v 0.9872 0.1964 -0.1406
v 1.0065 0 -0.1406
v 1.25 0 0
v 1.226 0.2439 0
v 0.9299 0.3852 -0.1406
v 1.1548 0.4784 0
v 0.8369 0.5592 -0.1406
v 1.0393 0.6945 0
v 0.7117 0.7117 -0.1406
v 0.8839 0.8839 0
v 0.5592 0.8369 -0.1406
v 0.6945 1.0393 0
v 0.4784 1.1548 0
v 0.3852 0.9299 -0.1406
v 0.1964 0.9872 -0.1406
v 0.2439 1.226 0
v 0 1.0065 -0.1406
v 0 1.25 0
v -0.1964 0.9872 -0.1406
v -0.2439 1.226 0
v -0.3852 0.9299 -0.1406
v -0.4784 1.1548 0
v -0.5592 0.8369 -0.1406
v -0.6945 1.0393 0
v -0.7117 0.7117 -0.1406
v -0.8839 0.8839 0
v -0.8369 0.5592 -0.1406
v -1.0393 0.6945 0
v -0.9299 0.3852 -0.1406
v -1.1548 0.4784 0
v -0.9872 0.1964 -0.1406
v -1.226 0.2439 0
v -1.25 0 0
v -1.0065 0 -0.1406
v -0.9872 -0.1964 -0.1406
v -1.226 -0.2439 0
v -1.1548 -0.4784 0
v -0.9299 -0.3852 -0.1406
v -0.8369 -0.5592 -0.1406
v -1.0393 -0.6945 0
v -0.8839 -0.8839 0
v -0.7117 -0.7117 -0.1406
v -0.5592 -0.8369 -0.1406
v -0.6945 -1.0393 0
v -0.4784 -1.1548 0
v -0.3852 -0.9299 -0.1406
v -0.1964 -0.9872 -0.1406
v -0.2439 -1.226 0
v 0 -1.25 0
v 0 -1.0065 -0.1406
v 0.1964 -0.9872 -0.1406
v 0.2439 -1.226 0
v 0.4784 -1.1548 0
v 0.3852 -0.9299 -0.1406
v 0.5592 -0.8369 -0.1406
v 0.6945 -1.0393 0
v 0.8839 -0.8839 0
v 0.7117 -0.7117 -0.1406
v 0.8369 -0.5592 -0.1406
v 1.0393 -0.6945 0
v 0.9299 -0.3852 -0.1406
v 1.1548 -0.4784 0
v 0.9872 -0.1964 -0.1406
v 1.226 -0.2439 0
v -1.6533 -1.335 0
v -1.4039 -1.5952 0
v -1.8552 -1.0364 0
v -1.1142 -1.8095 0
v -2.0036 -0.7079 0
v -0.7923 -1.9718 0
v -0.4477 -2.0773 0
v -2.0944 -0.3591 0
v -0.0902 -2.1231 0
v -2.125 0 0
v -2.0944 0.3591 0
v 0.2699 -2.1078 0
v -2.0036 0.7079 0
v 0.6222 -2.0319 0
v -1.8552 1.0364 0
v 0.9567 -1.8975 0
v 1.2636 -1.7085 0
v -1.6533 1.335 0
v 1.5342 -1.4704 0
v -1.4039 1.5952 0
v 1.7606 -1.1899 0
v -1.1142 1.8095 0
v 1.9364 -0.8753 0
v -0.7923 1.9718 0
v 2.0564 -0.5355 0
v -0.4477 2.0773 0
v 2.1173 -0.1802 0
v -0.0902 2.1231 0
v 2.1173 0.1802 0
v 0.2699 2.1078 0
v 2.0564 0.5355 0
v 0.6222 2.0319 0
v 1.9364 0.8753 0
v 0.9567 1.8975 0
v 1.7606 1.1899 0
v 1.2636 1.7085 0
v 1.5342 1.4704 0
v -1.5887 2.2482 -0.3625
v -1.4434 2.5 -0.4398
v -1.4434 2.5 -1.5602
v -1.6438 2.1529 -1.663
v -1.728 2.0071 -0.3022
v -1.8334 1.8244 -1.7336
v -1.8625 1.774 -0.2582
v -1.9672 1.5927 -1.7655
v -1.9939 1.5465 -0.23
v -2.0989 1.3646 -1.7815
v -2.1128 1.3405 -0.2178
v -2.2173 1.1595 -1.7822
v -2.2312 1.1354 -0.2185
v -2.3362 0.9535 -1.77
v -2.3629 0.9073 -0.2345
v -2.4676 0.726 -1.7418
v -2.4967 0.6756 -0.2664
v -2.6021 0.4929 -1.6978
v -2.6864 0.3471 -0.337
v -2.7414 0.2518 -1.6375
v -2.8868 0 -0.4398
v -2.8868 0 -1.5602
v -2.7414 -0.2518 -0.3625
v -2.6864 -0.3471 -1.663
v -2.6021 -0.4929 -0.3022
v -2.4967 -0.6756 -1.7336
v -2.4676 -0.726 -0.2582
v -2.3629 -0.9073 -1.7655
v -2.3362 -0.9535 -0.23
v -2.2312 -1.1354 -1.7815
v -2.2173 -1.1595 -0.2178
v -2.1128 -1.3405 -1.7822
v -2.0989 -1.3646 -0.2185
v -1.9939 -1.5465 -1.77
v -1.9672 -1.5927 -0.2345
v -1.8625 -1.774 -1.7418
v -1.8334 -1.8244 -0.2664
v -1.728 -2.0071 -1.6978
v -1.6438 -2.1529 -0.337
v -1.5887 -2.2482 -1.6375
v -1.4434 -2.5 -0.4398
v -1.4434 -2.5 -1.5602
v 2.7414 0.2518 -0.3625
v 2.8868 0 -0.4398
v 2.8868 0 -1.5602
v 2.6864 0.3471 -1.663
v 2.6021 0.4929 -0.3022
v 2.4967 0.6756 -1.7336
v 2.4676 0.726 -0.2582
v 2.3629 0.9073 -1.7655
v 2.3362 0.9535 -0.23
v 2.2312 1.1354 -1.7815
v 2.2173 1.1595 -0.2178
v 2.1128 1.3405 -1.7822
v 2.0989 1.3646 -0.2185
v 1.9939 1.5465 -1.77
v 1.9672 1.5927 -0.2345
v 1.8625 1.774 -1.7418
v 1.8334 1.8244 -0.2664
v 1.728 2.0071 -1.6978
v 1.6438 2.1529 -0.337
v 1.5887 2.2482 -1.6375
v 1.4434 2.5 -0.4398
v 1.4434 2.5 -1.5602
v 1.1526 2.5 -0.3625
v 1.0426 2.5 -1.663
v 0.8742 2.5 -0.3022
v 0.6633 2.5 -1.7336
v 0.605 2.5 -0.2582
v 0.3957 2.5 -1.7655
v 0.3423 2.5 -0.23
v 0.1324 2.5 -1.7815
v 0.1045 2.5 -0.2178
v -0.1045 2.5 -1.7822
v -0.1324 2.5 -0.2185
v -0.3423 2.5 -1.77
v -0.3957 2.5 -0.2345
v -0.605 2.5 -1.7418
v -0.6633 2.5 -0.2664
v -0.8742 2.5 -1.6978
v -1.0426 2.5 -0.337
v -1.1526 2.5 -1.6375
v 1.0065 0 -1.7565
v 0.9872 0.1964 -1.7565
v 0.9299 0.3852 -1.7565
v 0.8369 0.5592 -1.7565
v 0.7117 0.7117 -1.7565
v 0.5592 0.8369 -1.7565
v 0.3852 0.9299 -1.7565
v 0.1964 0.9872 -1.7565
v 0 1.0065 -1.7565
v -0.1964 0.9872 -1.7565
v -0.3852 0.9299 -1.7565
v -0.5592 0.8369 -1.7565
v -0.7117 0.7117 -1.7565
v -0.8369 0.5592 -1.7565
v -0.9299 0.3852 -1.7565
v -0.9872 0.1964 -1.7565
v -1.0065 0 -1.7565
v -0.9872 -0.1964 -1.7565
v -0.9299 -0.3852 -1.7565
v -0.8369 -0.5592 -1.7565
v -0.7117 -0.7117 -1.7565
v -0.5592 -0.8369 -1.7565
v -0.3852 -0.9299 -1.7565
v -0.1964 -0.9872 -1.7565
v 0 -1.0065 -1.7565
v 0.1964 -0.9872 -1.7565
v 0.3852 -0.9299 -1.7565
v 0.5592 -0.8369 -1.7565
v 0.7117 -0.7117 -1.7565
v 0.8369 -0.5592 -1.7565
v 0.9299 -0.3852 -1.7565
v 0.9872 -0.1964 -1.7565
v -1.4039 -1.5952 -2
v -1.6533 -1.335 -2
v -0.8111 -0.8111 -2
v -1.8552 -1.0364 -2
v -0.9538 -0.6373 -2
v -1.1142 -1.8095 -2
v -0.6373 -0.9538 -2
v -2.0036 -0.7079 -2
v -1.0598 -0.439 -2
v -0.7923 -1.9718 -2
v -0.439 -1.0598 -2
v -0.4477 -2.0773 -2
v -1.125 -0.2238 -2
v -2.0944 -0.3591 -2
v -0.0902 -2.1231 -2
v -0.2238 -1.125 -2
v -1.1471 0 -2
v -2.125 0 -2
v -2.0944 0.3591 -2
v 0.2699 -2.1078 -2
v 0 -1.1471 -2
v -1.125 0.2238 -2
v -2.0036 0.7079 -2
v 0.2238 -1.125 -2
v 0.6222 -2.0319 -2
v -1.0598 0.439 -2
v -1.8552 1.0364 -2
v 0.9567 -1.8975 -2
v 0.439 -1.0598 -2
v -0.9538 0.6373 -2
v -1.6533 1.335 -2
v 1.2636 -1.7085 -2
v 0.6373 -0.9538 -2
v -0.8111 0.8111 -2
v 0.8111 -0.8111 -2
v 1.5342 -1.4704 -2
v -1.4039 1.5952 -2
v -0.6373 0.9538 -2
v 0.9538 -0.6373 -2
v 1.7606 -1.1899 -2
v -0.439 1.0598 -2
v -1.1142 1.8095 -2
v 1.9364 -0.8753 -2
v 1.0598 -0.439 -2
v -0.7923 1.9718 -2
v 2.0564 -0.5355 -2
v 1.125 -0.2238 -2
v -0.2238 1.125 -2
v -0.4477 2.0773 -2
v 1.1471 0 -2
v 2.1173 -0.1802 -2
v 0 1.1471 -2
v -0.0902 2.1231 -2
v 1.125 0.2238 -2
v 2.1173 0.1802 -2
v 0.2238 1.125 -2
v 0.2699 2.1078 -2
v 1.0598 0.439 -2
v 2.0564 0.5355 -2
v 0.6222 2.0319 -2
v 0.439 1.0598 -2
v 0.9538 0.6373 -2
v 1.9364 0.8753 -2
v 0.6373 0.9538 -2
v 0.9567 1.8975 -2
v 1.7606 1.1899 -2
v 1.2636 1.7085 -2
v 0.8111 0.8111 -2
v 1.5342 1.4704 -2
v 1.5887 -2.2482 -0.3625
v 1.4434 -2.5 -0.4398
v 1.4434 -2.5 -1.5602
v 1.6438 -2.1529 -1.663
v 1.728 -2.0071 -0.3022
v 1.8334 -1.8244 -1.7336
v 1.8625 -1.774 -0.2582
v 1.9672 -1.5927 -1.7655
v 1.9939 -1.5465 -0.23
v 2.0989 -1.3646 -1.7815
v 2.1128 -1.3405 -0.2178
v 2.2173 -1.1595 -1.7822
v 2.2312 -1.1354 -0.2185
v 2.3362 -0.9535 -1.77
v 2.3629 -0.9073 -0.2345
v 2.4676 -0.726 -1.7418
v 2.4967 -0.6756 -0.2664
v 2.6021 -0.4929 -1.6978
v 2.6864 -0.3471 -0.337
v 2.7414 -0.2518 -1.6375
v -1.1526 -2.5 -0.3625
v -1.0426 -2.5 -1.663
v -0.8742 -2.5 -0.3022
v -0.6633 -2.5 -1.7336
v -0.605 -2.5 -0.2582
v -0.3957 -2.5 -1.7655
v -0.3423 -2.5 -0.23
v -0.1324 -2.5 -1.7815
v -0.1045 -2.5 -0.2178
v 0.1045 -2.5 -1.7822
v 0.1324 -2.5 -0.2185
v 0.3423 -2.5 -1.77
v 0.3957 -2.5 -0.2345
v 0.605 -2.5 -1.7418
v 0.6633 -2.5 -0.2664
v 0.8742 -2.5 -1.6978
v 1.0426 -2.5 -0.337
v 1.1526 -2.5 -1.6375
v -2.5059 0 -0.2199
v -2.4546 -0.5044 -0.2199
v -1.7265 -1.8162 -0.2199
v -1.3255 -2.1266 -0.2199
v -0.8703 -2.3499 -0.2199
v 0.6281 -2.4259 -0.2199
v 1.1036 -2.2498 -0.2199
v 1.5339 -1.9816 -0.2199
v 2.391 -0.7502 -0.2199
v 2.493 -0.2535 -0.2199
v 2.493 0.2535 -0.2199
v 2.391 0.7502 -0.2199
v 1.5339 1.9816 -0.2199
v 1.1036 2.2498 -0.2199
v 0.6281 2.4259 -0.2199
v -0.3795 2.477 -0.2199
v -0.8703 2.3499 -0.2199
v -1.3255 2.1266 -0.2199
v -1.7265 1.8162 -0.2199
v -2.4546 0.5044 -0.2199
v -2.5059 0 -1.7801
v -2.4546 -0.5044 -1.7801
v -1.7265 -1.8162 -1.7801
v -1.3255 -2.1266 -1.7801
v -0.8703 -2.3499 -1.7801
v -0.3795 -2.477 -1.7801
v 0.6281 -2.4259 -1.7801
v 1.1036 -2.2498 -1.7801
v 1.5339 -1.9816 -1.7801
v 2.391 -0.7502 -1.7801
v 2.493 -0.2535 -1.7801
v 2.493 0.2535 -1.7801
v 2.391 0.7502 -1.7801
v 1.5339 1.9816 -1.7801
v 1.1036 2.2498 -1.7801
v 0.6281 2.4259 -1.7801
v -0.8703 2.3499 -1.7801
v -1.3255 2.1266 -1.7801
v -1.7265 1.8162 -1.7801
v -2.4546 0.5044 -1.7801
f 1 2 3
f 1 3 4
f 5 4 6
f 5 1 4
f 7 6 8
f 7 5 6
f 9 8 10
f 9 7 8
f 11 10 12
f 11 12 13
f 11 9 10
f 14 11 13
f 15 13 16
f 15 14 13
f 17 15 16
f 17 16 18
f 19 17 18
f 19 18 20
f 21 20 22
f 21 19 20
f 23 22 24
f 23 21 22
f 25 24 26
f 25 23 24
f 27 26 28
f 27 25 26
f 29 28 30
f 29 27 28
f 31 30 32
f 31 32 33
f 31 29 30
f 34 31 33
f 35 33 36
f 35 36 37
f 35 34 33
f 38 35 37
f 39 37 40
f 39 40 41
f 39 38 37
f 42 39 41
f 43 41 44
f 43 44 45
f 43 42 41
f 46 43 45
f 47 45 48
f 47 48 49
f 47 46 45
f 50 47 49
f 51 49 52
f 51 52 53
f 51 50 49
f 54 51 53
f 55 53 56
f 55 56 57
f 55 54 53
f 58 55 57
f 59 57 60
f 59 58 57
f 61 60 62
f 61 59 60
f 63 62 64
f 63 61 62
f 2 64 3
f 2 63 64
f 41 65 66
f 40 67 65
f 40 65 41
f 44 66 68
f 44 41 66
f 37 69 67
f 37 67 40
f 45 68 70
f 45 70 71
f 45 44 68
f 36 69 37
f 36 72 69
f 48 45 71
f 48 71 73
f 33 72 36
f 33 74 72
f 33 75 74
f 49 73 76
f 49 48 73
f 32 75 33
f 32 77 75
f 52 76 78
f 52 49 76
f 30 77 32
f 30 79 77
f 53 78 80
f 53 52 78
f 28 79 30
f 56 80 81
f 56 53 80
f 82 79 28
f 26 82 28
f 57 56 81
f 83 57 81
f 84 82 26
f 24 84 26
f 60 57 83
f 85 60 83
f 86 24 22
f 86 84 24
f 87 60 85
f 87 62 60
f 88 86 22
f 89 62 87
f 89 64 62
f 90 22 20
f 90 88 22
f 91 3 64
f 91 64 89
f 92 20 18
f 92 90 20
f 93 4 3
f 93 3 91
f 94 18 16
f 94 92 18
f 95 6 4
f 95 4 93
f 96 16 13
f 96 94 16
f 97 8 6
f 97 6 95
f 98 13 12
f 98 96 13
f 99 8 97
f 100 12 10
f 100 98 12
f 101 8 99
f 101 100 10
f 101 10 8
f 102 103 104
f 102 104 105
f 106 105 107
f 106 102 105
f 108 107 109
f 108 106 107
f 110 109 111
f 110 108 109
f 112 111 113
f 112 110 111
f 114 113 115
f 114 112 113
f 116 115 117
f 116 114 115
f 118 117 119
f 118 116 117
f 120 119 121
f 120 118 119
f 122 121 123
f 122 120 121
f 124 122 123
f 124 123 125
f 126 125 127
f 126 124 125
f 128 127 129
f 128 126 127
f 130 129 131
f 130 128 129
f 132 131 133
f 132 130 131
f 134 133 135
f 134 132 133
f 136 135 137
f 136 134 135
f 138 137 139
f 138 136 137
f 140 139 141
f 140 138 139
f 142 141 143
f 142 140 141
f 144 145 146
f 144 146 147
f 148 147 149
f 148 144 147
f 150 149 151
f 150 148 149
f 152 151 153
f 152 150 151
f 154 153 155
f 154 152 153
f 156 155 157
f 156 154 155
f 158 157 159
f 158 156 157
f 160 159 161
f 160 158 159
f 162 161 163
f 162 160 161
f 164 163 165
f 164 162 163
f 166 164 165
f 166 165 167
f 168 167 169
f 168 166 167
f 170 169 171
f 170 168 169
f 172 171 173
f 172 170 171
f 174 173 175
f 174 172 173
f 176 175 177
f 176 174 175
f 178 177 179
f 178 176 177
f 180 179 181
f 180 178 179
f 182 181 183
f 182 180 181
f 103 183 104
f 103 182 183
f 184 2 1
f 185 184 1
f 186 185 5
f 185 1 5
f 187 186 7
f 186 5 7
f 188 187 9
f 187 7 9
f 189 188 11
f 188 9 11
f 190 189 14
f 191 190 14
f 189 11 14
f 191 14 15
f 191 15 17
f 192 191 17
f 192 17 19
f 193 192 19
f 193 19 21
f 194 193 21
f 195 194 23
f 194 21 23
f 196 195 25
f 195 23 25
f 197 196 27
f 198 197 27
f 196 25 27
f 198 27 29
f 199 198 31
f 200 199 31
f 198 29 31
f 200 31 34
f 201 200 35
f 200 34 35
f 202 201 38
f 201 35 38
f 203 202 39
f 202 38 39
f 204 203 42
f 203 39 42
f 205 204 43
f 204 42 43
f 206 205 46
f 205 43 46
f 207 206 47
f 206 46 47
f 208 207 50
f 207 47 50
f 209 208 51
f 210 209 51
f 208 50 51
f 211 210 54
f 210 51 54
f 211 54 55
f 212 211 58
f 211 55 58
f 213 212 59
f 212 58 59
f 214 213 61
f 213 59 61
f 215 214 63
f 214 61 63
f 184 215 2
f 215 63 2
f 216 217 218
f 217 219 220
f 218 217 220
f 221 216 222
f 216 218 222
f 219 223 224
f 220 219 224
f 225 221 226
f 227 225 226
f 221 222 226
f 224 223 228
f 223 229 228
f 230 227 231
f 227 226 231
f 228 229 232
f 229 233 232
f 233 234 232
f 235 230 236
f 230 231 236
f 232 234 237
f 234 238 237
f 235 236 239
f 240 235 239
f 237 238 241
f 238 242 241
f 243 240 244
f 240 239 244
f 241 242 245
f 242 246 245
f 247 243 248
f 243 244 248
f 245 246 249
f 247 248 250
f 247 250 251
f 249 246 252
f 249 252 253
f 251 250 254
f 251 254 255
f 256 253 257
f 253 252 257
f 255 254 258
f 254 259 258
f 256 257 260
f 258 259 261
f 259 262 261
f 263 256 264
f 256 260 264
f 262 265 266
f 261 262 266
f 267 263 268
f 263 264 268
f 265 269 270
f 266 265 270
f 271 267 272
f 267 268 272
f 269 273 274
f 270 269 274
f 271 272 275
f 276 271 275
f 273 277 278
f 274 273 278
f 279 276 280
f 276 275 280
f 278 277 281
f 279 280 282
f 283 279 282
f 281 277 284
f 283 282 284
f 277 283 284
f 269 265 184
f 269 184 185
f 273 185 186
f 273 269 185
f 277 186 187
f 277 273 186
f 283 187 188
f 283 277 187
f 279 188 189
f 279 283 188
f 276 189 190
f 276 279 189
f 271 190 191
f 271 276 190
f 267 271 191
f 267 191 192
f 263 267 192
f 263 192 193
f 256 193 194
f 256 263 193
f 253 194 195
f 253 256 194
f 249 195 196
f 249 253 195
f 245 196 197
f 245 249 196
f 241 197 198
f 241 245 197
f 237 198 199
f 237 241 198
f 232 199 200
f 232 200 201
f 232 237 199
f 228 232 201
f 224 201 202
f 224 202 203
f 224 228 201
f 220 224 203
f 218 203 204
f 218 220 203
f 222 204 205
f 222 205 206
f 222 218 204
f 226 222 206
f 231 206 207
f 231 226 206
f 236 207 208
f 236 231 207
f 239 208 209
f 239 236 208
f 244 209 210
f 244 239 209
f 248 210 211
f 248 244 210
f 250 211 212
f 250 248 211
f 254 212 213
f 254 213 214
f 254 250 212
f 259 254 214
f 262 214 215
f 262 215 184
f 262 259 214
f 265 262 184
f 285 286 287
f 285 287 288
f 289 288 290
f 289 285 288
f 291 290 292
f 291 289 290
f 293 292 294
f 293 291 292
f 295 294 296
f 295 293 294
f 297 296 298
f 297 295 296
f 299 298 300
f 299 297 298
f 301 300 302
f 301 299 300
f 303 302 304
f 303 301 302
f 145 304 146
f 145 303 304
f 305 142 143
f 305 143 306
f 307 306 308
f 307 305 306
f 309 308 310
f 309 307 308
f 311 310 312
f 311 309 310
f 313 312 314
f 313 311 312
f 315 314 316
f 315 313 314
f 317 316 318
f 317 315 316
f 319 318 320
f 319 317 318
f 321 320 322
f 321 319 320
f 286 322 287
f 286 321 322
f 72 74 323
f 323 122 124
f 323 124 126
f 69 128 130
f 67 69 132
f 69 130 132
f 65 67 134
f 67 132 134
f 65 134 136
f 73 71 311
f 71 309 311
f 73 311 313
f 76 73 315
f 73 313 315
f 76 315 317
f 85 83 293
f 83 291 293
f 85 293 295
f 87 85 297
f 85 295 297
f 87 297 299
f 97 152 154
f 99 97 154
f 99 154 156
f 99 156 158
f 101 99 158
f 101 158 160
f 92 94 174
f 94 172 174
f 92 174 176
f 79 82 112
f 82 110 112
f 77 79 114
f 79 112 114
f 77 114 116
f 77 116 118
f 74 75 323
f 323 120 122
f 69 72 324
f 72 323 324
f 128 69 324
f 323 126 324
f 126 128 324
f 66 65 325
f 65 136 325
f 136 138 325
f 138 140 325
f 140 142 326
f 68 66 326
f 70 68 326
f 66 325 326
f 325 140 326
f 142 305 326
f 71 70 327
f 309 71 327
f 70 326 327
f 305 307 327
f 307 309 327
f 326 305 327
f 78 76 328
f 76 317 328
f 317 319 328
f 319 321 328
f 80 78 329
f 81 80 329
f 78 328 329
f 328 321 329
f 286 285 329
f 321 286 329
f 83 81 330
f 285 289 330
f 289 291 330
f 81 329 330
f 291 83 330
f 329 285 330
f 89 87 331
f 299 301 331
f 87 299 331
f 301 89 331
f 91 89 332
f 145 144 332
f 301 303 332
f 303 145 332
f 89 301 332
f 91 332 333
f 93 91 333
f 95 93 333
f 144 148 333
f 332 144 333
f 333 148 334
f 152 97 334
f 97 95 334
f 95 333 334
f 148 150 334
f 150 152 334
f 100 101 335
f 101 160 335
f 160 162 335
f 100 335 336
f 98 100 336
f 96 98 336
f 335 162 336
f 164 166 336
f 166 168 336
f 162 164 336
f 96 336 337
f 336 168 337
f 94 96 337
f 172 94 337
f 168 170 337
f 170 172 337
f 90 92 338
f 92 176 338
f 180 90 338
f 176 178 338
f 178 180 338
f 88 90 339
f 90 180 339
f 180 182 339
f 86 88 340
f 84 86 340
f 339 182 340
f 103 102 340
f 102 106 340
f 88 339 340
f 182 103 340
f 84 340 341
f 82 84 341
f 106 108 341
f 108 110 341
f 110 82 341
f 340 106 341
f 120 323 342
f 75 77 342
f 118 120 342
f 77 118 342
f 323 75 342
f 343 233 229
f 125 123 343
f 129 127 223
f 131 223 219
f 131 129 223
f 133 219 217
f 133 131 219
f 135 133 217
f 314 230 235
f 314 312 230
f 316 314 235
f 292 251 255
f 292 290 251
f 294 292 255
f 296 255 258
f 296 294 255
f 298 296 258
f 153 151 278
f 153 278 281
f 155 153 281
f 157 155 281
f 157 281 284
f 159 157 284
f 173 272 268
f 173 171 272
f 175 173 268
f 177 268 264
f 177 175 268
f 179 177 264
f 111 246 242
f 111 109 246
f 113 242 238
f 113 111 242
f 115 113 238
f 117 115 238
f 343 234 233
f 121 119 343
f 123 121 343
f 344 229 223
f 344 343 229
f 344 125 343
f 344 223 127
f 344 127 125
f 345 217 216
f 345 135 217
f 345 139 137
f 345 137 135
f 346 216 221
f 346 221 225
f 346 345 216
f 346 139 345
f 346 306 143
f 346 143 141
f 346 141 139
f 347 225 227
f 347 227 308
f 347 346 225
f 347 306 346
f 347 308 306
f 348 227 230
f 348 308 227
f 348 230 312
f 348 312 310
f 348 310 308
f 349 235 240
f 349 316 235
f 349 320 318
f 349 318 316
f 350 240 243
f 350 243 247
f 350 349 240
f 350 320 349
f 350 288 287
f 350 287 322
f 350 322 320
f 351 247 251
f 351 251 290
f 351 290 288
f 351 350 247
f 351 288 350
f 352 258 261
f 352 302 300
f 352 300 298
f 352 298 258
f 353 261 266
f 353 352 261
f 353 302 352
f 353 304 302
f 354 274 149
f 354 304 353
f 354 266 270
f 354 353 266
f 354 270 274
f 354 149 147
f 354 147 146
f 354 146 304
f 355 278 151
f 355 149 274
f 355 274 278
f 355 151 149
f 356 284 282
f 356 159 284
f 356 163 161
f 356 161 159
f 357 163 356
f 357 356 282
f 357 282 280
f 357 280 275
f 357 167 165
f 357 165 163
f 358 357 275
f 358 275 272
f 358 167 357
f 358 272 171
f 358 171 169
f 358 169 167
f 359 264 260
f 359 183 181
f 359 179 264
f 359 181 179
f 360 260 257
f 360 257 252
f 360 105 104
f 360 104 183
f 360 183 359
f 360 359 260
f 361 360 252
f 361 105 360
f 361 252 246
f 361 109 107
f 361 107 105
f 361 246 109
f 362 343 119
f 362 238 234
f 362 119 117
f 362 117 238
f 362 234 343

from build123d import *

# Parameters (mm, degrees)
SKETCH1_R               = 1.0065
BASENUT_DEPTH           = 2
ENDCHAMFER_SIZE         = 0.2435
ENDCHAMFER_SIZE2        = 0.140584791
ENDCHAMFER_PART_2_SIZE  = 0.2435
ENDCHAMFER_PART_2_SIZE2 = 0.140584791


with BuildPart() as part:
    # Sketch1 → BaseNut (new body)
    with BuildSketch(Plane.XY):
        Polygon((2.886751346, 0), (1.443375673, 2.5), (-1.443375673, 2.5), (-2.886751346, 0), (-1.443375673, -2.5), (1.443375673, -2.5), align=None)
        Circle(SKETCH1_R, mode=Mode.SUBTRACT)
    extrude(amount=-BASENUT_DEPTH)

    # Sketch2 → Double-Chamfer (revolve, cut)
    with BuildSketch(Plane(origin=(0, 0, 0), x_dir=(1, 0, 0), z_dir=(0, 1, 0))):
        Polygon((-2.886751346, 2), (-2.125, 2), (-2.886751346, 1.560202655), align=None)
        Polygon((-2.886751346, 0.439797345), (-2.886751346, 0), (-2.125, 0), align=None)
    revolve(axis=Axis((0, 0, -3.375940562), (0, 0, 1)), mode=Mode.SUBTRACT)

    # EndChamfer
    endchamfer_edges = [part.edges().sort_by_distance(p)[0] for p in [
        (-1.0065, 0, -2),
    ]]
    endchamfer_side = [part.faces().sort_by_distance(p)[0] for p in [
        (-1.0065, 0, -1),
    ]]
    chamfer(endchamfer_edges, length=ENDCHAMFER_SIZE, length2=ENDCHAMFER_SIZE2, reference=endchamfer_side[0])

    # EndChamfer part 2
    endchamfer_part_2_edges = [part.edges().sort_by_distance(p)[0] for p in [
        (-1.0065, 0, 0),
    ]]
    endchamfer_part_2_side = [part.faces().sort_by_distance(p)[0] for p in [
        (2.064895924, 0, 0),
    ]]
    chamfer(endchamfer_part_2_edges, length=ENDCHAMFER_PART_2_SIZE, length2=ENDCHAMFER_PART_2_SIZE2, reference=endchamfer_part_2_side[0])


solid = part.part
